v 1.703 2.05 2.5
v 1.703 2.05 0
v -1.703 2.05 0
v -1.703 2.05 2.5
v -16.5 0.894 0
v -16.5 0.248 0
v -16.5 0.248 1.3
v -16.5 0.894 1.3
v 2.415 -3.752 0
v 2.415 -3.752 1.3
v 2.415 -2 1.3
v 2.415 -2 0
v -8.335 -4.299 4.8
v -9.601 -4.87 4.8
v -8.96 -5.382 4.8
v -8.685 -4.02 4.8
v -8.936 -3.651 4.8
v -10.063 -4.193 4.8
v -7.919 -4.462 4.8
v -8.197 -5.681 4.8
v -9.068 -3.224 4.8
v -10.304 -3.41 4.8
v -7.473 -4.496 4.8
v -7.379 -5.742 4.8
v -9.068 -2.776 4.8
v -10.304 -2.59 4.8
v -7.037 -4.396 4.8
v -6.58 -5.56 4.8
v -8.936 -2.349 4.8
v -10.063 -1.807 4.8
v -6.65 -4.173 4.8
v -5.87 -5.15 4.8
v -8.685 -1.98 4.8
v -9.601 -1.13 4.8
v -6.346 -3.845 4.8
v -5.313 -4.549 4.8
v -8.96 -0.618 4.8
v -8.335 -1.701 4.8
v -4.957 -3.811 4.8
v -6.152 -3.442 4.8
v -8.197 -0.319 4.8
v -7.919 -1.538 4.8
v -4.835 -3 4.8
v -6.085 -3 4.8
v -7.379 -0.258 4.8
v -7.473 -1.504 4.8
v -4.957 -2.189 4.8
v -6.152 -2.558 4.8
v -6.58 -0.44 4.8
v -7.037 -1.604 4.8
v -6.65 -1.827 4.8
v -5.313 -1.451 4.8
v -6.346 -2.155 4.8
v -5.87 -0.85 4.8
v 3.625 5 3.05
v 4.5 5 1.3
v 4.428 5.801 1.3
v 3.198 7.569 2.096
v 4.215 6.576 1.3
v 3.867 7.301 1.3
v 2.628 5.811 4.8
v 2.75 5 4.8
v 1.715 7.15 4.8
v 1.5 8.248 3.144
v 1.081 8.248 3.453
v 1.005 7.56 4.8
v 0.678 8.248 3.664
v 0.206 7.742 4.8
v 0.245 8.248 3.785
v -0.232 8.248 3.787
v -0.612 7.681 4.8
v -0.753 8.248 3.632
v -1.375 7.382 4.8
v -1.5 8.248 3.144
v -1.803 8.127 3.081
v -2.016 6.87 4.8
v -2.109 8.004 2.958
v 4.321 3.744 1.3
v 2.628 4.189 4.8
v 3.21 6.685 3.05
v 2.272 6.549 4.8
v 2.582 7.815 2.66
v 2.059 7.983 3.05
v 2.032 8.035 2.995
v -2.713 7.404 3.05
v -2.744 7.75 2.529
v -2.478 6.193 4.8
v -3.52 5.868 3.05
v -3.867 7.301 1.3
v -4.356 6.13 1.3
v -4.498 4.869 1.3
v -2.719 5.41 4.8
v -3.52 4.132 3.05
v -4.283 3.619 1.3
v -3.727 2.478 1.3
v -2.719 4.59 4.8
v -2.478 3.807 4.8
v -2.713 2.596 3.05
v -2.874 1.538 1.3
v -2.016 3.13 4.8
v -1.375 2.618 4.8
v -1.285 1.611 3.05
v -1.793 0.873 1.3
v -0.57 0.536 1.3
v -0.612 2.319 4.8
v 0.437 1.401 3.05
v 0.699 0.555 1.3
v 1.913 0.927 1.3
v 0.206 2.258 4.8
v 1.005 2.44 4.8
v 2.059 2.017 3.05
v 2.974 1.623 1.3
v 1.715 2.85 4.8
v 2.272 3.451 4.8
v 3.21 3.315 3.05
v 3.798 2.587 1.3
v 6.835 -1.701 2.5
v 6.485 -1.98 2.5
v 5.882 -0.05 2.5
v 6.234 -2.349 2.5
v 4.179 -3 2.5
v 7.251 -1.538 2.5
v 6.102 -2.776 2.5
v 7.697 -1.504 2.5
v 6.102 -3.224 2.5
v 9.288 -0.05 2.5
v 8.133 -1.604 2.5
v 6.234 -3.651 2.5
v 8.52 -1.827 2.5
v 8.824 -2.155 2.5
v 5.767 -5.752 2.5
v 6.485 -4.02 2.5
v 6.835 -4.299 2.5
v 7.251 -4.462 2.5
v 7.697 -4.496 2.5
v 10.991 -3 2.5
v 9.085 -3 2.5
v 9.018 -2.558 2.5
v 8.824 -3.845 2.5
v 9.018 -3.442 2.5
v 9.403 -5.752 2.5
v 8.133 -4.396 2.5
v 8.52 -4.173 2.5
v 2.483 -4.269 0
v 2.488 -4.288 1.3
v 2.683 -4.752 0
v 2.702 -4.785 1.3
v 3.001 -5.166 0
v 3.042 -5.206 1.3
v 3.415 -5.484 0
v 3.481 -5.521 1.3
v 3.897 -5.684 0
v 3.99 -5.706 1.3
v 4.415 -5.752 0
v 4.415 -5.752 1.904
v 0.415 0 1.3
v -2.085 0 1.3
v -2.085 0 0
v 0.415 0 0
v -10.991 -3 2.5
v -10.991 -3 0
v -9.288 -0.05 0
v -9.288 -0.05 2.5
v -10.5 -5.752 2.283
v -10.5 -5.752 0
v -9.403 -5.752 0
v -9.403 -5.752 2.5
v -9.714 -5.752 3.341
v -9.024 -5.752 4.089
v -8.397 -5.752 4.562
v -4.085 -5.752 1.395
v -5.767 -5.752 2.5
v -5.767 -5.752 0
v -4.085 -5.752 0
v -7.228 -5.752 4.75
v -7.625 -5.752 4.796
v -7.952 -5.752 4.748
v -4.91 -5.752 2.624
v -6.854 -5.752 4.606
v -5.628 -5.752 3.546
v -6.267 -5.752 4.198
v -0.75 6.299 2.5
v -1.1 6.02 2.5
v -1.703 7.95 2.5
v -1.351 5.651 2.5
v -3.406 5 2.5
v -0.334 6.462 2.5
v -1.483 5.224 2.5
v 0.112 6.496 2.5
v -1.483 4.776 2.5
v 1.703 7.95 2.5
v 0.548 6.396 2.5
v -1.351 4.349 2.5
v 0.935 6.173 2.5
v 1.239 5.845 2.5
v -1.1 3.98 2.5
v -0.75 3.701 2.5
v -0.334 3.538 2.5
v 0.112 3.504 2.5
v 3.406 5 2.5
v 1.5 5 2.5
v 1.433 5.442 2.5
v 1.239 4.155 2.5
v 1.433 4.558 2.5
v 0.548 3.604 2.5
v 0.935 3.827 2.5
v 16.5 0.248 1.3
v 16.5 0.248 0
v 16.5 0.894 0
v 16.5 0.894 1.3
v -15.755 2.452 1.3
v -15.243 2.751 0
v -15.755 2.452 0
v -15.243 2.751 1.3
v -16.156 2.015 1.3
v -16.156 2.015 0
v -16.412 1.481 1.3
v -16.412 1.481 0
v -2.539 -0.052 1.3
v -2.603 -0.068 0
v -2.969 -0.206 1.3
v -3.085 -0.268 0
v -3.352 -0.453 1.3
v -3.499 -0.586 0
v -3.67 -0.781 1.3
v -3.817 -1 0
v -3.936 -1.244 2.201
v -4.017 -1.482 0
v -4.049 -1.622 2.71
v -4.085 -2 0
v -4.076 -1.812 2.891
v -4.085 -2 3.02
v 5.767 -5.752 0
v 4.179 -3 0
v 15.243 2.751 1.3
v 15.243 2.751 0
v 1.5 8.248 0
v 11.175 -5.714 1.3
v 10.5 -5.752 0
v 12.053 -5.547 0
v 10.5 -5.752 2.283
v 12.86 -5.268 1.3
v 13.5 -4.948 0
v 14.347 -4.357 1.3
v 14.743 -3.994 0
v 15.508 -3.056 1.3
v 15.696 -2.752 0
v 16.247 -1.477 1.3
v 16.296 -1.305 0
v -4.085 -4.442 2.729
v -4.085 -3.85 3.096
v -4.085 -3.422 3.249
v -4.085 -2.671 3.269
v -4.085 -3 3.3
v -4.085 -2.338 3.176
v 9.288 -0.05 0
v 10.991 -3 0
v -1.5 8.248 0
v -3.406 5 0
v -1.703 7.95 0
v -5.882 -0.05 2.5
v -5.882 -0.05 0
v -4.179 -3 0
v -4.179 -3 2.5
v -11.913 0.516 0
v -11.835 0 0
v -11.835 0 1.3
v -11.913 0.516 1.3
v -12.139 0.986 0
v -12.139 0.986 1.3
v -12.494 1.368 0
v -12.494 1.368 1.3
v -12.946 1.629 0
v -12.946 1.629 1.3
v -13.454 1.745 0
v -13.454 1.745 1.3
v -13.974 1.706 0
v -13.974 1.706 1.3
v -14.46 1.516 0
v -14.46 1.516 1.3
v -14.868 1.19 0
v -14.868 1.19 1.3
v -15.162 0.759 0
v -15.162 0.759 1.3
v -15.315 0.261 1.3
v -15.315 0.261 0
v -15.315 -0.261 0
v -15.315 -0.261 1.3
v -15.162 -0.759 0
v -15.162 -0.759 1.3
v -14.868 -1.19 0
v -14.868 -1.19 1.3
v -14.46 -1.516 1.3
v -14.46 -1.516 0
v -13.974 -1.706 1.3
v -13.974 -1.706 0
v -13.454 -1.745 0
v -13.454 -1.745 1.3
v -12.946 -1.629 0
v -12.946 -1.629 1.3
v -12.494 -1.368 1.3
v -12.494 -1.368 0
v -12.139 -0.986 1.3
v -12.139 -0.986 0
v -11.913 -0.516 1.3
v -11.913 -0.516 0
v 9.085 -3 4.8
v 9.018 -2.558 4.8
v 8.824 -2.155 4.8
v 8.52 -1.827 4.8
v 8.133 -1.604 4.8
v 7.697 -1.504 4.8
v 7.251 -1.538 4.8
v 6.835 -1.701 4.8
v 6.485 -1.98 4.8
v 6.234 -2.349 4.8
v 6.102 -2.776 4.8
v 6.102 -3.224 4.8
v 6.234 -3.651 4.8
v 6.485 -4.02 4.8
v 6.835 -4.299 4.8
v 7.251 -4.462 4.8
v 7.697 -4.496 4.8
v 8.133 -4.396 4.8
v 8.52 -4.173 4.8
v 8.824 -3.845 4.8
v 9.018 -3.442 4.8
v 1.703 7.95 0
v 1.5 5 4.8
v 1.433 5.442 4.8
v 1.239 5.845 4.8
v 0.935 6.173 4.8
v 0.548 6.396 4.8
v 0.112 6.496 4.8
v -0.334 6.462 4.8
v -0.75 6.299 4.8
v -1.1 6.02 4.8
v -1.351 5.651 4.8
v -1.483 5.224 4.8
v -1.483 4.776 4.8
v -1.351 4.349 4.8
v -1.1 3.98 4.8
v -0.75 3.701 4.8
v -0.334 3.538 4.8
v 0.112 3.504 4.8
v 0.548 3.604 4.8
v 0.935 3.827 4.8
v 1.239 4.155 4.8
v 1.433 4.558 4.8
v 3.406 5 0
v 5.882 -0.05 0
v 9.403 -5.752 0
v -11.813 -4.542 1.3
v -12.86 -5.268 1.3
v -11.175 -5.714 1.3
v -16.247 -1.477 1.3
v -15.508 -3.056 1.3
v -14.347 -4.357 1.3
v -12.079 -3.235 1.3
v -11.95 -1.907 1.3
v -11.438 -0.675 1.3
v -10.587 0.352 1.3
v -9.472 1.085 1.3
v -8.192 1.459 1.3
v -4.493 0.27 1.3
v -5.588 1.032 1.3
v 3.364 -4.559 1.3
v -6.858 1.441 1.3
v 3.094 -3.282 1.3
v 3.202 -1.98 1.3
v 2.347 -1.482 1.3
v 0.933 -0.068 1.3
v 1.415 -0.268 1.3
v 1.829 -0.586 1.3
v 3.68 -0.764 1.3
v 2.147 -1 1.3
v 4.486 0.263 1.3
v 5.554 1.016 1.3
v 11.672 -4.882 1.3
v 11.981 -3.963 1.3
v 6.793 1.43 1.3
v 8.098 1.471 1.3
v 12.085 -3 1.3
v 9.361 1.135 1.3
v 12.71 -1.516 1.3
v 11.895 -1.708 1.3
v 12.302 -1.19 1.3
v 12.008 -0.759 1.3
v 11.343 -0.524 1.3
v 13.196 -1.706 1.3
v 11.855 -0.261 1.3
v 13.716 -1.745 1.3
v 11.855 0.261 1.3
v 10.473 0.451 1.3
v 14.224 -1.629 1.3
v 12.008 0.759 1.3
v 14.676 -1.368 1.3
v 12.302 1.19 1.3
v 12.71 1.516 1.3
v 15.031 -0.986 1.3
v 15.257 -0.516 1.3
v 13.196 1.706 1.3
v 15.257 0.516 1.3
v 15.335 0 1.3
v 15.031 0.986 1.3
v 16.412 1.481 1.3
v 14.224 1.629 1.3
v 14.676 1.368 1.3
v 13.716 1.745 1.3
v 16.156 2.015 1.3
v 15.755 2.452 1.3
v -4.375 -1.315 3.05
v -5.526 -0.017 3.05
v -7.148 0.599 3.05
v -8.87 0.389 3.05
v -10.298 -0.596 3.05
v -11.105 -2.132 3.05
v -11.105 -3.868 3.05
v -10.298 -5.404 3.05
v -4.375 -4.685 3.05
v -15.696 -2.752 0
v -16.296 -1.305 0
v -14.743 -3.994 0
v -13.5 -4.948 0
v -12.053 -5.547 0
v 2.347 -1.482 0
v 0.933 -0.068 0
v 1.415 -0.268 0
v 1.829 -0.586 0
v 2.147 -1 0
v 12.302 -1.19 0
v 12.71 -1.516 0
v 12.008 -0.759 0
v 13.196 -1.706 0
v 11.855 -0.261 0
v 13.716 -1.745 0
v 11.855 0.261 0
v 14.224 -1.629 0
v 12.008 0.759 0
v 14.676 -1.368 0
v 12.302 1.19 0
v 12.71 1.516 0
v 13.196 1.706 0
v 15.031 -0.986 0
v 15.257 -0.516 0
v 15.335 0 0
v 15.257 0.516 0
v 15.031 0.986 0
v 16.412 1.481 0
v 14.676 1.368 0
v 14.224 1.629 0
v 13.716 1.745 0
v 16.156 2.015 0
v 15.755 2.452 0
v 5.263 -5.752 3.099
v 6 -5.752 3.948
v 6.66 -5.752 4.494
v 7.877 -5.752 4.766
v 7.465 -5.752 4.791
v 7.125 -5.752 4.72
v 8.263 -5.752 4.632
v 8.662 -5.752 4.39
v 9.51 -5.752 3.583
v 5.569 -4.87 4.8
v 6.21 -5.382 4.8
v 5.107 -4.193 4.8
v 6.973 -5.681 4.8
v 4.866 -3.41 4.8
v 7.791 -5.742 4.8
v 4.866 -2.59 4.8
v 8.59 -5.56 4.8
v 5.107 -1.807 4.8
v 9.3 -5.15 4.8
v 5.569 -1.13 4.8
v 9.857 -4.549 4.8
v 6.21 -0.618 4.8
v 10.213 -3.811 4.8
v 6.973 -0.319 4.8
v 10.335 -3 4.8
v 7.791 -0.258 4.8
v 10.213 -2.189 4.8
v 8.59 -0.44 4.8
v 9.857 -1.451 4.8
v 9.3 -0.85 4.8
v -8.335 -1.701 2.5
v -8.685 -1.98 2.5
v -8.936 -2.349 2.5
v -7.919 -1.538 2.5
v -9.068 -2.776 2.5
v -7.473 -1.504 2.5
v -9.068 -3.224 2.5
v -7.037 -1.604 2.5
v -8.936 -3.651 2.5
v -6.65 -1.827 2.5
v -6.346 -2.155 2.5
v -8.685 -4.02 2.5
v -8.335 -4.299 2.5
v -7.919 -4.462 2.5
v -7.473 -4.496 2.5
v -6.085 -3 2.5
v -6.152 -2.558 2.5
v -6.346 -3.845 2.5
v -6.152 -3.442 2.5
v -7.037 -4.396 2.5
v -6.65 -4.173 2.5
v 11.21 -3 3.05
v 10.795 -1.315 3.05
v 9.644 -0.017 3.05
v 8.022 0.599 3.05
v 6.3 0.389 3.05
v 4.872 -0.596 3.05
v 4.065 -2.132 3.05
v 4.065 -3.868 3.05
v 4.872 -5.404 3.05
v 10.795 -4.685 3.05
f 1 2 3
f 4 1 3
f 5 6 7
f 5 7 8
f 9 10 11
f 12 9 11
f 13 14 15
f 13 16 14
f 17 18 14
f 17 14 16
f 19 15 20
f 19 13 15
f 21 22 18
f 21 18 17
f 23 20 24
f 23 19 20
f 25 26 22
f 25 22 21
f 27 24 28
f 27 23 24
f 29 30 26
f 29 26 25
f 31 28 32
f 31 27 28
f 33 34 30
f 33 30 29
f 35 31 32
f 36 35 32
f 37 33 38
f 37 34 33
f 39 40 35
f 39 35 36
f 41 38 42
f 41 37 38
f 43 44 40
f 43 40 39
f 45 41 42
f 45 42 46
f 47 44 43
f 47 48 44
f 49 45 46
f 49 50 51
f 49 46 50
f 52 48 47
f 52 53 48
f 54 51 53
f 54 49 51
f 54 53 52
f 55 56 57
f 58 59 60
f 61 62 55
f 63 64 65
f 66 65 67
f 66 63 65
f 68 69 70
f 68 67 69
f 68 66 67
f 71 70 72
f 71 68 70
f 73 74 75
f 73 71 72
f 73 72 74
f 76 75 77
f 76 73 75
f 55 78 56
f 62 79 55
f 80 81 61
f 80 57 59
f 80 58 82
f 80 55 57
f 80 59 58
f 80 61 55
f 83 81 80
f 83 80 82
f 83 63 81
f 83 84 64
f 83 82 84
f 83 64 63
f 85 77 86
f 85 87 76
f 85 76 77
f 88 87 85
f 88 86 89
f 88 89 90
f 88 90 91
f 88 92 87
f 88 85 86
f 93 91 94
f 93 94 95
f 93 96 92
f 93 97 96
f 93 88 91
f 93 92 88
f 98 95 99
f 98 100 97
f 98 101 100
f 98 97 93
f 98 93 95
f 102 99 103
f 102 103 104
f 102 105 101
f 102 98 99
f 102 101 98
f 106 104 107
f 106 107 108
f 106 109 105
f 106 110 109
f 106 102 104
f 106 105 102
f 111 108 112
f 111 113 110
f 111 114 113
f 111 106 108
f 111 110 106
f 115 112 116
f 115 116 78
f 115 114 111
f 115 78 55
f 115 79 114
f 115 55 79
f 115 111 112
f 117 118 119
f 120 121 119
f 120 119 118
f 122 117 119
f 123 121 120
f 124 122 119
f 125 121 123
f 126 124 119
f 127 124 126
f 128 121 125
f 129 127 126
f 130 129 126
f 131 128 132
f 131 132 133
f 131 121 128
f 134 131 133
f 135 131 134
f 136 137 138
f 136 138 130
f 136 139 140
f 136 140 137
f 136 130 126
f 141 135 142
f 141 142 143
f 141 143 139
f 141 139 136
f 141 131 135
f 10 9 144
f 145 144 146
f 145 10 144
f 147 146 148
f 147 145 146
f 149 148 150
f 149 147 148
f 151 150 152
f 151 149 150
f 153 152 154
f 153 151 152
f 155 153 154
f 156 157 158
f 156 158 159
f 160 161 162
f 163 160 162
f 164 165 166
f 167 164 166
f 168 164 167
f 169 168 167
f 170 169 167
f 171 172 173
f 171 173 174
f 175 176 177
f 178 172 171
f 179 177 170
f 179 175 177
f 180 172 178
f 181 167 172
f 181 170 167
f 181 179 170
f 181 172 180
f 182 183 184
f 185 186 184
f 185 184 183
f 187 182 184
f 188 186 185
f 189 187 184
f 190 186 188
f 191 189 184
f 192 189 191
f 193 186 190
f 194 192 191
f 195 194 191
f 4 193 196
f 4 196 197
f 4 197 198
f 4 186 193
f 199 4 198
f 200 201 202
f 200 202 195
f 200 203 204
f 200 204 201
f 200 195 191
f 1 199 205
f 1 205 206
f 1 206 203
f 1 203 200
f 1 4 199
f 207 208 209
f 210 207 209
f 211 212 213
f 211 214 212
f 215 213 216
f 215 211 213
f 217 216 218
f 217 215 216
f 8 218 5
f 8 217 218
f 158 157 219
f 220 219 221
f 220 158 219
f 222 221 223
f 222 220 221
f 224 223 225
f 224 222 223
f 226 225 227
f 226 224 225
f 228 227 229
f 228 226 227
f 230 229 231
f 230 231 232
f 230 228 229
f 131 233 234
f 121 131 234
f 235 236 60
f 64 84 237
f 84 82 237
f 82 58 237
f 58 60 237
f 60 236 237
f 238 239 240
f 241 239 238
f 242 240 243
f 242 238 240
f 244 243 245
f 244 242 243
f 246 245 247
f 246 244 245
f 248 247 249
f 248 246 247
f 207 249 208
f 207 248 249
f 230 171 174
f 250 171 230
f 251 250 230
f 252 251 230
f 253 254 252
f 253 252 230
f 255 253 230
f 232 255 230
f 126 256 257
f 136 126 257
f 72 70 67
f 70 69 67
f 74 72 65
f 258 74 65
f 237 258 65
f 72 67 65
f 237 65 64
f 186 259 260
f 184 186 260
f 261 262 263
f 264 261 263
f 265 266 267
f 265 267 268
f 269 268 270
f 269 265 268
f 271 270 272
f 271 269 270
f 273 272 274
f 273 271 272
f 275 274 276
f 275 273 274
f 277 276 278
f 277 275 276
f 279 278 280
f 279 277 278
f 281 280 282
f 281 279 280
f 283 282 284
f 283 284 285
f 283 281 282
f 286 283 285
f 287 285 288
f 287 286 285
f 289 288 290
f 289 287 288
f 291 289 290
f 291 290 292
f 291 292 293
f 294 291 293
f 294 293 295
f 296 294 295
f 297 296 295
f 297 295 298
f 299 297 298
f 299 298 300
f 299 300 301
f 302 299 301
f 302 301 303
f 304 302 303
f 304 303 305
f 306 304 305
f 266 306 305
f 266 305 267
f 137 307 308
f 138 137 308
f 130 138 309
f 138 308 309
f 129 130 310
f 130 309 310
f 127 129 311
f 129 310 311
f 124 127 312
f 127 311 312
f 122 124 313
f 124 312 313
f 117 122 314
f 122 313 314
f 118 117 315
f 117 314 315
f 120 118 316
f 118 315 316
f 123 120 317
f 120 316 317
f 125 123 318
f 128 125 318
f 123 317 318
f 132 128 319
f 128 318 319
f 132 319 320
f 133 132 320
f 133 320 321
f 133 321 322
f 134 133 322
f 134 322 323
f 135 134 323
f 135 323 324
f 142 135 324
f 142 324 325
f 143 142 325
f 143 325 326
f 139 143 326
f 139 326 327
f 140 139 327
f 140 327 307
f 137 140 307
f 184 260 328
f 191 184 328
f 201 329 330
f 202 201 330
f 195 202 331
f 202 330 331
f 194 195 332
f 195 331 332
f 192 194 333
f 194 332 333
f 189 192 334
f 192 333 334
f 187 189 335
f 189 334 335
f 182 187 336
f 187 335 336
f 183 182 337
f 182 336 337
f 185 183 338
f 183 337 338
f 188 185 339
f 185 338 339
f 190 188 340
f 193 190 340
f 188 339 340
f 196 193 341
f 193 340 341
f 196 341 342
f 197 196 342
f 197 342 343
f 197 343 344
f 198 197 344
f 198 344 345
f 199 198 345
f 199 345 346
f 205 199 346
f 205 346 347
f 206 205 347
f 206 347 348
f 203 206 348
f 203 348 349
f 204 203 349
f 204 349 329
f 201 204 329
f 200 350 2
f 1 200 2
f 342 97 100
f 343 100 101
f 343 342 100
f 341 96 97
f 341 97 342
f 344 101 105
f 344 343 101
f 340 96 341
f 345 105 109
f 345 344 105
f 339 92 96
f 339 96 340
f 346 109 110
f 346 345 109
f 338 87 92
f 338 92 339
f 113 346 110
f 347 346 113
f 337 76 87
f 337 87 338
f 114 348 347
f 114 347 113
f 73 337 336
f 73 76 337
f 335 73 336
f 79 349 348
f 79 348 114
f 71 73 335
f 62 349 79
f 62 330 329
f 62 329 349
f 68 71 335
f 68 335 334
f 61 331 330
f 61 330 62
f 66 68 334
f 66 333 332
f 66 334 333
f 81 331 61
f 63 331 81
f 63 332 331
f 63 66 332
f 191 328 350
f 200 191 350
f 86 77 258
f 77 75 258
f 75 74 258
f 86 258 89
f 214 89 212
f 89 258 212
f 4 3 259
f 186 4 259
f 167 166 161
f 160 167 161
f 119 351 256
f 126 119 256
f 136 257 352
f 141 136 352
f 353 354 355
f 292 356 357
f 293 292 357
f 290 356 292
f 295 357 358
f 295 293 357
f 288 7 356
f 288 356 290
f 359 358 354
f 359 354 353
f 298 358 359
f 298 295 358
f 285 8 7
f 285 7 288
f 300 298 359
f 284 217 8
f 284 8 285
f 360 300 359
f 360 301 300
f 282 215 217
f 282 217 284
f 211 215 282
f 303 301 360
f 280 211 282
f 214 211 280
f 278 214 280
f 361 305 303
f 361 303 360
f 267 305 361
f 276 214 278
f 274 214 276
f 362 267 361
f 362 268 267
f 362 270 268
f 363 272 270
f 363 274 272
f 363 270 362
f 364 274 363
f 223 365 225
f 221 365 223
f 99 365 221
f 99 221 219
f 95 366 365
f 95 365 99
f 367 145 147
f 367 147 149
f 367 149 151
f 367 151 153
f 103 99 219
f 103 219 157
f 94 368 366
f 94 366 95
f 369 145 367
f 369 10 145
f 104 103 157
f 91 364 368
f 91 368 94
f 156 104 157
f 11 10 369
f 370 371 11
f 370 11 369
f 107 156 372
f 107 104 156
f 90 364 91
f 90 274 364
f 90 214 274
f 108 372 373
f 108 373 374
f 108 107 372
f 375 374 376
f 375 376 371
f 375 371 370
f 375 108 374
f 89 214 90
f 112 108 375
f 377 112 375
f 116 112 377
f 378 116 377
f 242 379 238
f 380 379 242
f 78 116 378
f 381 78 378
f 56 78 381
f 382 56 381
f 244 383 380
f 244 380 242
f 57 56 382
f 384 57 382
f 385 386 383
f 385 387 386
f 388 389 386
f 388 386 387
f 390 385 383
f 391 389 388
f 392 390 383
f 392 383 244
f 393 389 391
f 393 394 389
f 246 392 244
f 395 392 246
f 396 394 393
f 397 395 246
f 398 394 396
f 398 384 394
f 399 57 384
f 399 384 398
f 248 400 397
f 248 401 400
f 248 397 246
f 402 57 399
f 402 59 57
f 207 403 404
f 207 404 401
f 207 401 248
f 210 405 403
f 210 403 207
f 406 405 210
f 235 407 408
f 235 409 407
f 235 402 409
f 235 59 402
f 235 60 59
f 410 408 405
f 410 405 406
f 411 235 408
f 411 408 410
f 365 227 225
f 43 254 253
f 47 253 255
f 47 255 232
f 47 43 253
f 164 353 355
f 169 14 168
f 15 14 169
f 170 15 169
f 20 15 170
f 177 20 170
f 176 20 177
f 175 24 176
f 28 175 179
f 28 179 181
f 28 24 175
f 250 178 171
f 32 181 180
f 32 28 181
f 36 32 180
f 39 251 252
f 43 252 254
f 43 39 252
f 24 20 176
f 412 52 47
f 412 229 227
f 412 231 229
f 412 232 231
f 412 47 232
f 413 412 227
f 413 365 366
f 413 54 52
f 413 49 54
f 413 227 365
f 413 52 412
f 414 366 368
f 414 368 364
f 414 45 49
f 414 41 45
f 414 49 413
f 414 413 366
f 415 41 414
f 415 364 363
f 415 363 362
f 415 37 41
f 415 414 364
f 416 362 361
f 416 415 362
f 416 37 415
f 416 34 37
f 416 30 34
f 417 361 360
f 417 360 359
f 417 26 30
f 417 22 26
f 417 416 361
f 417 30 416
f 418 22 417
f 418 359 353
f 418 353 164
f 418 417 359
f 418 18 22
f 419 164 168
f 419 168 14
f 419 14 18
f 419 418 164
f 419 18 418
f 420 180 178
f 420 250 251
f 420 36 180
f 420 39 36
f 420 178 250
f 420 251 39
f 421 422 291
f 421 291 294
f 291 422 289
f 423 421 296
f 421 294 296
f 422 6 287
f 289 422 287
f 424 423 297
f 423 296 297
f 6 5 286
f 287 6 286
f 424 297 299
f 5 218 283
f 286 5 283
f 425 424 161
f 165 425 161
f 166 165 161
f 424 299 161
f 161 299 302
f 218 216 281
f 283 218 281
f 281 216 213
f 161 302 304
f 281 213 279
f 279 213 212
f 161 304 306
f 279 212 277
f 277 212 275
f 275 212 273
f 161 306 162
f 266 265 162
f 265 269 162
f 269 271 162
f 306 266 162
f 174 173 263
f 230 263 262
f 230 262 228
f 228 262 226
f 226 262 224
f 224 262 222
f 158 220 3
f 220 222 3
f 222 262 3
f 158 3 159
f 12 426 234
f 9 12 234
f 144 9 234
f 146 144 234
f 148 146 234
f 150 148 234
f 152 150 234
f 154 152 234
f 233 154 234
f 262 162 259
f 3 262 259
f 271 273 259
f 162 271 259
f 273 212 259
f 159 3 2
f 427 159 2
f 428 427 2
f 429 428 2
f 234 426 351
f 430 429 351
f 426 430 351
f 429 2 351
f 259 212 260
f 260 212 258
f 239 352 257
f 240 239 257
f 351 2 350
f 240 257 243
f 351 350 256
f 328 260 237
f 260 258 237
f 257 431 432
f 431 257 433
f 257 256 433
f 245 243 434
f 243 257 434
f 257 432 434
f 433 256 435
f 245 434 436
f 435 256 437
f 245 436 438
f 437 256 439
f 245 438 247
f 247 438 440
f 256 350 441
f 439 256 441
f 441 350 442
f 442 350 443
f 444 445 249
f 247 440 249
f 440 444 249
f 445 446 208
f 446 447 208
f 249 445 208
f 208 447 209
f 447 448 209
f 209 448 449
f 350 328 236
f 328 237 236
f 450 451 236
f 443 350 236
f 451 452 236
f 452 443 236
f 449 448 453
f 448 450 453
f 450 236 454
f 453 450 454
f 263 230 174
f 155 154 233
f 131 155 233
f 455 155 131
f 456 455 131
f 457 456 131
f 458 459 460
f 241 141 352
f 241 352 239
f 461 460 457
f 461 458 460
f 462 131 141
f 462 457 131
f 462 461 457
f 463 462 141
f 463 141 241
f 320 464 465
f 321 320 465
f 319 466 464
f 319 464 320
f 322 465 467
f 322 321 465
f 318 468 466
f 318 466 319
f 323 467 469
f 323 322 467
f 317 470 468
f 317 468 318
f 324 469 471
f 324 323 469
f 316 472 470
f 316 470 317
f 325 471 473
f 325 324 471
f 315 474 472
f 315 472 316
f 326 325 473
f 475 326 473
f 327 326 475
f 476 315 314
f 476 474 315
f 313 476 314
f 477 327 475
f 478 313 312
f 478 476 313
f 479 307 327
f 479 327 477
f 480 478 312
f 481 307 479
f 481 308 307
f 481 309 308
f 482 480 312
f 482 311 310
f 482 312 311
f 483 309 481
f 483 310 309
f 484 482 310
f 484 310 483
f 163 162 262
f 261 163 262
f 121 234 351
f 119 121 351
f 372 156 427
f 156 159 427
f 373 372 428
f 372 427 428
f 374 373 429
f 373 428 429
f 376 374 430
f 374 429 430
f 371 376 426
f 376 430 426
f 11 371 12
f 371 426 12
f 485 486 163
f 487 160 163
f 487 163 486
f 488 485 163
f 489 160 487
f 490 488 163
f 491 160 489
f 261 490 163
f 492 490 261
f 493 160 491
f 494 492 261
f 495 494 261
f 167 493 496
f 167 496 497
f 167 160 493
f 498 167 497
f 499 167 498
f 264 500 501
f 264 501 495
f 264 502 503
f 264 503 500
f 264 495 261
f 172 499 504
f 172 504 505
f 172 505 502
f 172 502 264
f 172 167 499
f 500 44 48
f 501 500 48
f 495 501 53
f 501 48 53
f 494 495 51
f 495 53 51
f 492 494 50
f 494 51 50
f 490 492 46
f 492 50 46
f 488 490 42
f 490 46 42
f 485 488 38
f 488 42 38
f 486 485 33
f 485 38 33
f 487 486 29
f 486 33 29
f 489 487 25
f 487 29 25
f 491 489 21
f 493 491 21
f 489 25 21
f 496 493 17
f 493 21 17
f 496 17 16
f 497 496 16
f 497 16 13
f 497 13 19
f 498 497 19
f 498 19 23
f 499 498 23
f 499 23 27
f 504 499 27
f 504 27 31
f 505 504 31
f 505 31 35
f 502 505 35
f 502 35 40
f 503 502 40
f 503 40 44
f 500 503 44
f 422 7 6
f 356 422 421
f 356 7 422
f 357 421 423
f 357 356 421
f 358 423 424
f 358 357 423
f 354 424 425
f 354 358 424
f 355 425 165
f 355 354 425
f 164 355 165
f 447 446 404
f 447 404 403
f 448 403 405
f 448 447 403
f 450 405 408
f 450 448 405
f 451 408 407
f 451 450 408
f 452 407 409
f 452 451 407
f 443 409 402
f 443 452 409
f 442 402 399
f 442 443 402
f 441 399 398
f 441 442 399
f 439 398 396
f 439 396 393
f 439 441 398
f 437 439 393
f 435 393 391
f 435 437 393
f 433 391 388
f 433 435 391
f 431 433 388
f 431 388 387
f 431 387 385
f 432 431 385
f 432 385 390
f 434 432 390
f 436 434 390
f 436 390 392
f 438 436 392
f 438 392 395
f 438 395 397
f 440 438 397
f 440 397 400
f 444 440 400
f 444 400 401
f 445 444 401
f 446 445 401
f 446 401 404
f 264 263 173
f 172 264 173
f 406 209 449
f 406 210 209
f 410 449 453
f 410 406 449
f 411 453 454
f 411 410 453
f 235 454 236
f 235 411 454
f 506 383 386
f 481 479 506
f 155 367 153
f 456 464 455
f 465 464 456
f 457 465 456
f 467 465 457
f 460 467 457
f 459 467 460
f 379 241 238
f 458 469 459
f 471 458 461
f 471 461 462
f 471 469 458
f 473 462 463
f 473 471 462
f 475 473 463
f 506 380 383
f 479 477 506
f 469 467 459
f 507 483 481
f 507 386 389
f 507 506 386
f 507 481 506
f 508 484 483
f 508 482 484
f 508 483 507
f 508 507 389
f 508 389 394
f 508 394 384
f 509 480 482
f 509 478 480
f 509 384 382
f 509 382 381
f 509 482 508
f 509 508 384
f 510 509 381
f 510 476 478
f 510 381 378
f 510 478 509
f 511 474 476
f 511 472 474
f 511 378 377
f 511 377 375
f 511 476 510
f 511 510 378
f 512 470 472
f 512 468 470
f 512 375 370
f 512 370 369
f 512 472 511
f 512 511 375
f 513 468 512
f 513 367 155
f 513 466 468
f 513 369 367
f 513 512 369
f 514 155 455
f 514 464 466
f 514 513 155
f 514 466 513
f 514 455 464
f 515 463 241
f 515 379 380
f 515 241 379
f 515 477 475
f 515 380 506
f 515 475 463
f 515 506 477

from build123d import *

# Parameters (mm, degrees)
F0_W         = 33
F0_H         = 14
F0_R         = 1.75
F1_DEPTH     = 4.8
F2_R         = 1.5
F4_DEPTH     = 4.8
F2_W         = 33
F2_H         = 14
F2_R_2       = 2.5
F2_R_3       = 1.75
F5_DEPTH     = 3.5
F7_DEPTH     = 2.5
F8_W         = 6.5
F8_H         = 5.7518341467
F9_DEPTH     = 12.5
F10_R        = 6
F11_T1_DEPTH = 79.0934091739
F12_R        = 2


# Not quite as in the source:
# - a fillet or chamfer that OpenCascade refuses, or shapes differently, is made with other operations: its cross-section is extruded or revolved along the edge and cut away or added


with BuildPart() as f1:
    # F0 (on Top) → F1 (new body)
    with BuildSketch(Plane.XY):
        with Locations((0, 1.2481658533)):
            Rectangle(F0_W, F0_H)
        with Locations((-13.585, 0)):
            Circle(F0_R, mode=Mode.SUBTRACT)
        with Locations((13.585, 0)):
            Circle(F0_R, mode=Mode.SUBTRACT)
    extrude(amount=F1_DEPTH)

    # F2 (on face) → F4 (cut, through all)
    with BuildSketch(Plane.XY.offset(4.8)):
        with Locations((-7.585, -3)):
            Circle(F2_R)
        with Locations((0, 5)):
            Circle(F2_R)
        with Locations((7.585, -3)):
            Circle(F2_R)
    extrude(amount=-F4_DEPTH, mode=Mode.SUBTRACT)

    # F2 (on face) → F5 (cut)
    with BuildSketch(Plane.XY.offset(4.8)):
        with Locations((0, 1.2481658533)):
            Rectangle(F2_W, F2_H)
        with Locations((-7.585, -3)):
            Circle(F2_R_2, mode=Mode.SUBTRACT)
        with Locations((-13.585, 0)):
            Circle(F2_R_3, mode=Mode.SUBTRACT)
        with Locations((7.585, -3)):
            Circle(F2_R_2, mode=Mode.SUBTRACT)
        with Locations((13.585, 0)):
            Circle(F2_R_3, mode=Mode.SUBTRACT)
        with Locations((0, 5)):
            Circle(F2_R_2, mode=Mode.SUBTRACT)
    extrude(amount=-F5_DEPTH, mode=Mode.SUBTRACT)

    # F6: chamfer of 4 x 2 on 3 edges, made by hand


with BuildPart() as f6_tool2:
    # F6_s3 → F6_t4 (revolve)
    with BuildSketch(Plane.XZ.offset(3)):
        Polygon((-3.085, 1.3), (-5.085, 5.3), (-5.085, 1.3), align=None)
    revolve(axis=Axis((-7.585, -3, 1.3), (0, 0, 1)))

    split(bisect_by=Plane.XZ.offset(5.7518341467), keep=Keep.BOTTOM)

    split(bisect_by=Plane.XY.offset(4.8), keep=Keep.BOTTOM)


with BuildPart() as f1_1:
    add(f1.part)

    # F6_t1: union F6_tool2
    add(f6_tool2.part)


with BuildPart() as f6_tool8:
    # F6_s9 → F6_t10 (revolve)
    with BuildSketch(Plane.XZ.offset(-5)):
        Polygon((4.5, 1.3), (2.5, 5.3), (2.5, 1.3), align=None)
    revolve(axis=Axis((0, 5, 1.3), (0, 0, 1)))

    split(bisect_by=Plane.XZ.offset(-8.2481658533), keep=Keep.TOP)

    split(bisect_by=Plane.XY.offset(4.8), keep=Keep.BOTTOM)


with BuildPart() as f1_2:
    add(f1_1.part)

    # F6_t7: union F6_tool8
    add(f6_tool8.part)


with BuildPart() as f6_tool14:
    # F6_s15 → F6_t16 (revolve)
    with BuildSketch(Plane.XZ.offset(3)):
        Polygon((12.085, 1.3), (10.085, 5.3), (10.085, 1.3), align=None)
    revolve(axis=Axis((7.585, -3, 1.3), (0, 0, 1)))

    split(bisect_by=Plane.XZ.offset(5.7518341467), keep=Keep.BOTTOM)

    split(bisect_by=Plane.XY.offset(4.8), keep=Keep.BOTTOM)


with BuildPart() as f1_3:
    add(f1_2.part)

    # F6_t13: union F6_tool14
    add(f6_tool14.part)

    # F3 (on face) → F7 (cut)
    with BuildSketch(Plane(origin=(0, 0, 0), x_dir=(1, 0, 0), z_dir=(0, 0, -1))):
        Polygon((-5.8818167059, 5.95), (-9.2881832941, 5.95), (-9.4025944029, 5.7518341467), (-5.7674055971, 5.7518341467), align=None)
        Polygon((9.4025944029, 5.7518341467), (5.7674055971, 5.7518341467), (4.1786334118, 3), (5.8818167059, 0.05), (9.2881832941, 0.05), (10.9913665882, 3), align=None)
        Polygon((-1.7031832941, -7.95), (1.7031832941, -7.95), (3.4063665882, -5), (1.7031832941, -2.05), (-1.7031832941, -2.05), (-3.4063665882, -5), align=None)
        Polygon((-5.7674055971, 5.7518341467), (-9.4025944029, 5.7518341467), (-10.9913665882, 3), (-9.2881832941, 0.05), (-5.8818167059, 0.05), (-4.1786334118, 3), align=None)
    extrude(amount=-F7_DEPTH, mode=Mode.SUBTRACT)

    # F8 (on face) → F9 (cut, symmetric)
    with BuildSketch(Plane.XY.offset(1.3)):
        with Locations((-0.835, -2.8759170733)):
            Rectangle(F8_W, F8_H)
    extrude(amount=F9_DEPTH, both=True, mode=Mode.SUBTRACT)

    # F10
    f10_edges = [f1_3.edges().sort_by_distance(p)[0] for p in [
        (-16.5, -5.751834, 0.65),
        (16.5, -5.751834, 0.65),
    ]]
    fillet(f10_edges, radius=F10_R)

    # F11: chamfer of 6 x 15 on 2 edges, made by hand

    # F11_s2 → F11_t1 (cut)
    with BuildSketch(Plane.XY.offset(-38.896704587)):
        Polygon((-1.5, 8.2481658533), (-16.5, 2.2481658533), (-16.5, 8.2481658533), align=None)
        Polygon((16.5, 2.2481658533), (1.5, 8.2481658533), (16.5, 8.2481658533), align=None)
    extrude(amount=F11_T1_DEPTH, mode=Mode.SUBTRACT)

    # F12 (call 1 of 5: OpenCascade refuses the feature's edges together)
    f12_edges = [f1_3.edges().sort_by_distance(p)[0] for p in [
        (-4.085, 0, 0.65),
    ]]
    fillet(f12_edges, radius=F12_R)

    # F12#2 (call 2 of 5)
    f12_2_edges = [f1_3.edges().sort_by_distance(p)[0] for p in [
        (2.415, 0, 0.65),
    ]]
    fillet(f12_2_edges, radius=F12_R)

    # F12#3 (call 3 of 5)
    f12_3_edges = [f1_3.edges().sort_by_distance(p)[0] for p in [
        (2.415, -5.751834, 0.65),
    ]]
    fillet(f12_3_edges, radius=F12_R)

    # F12#4 (call 4 of 5)
    f12_4_edges = [f1_3.edges().sort_by_distance(p)[0] for p in [
        (16.5, 2.248166, 0.65),
    ]]
    fillet(f12_4_edges, radius=F12_R)

    # F12#5 (call 5 of 5)
    f12_5_edges = [f1_3.edges().sort_by_distance(p)[0] for p in [
        (-16.5, 2.248166, 0.65),
    ]]
    fillet(f12_5_edges, radius=F12_R)


solid = f1_3.part
